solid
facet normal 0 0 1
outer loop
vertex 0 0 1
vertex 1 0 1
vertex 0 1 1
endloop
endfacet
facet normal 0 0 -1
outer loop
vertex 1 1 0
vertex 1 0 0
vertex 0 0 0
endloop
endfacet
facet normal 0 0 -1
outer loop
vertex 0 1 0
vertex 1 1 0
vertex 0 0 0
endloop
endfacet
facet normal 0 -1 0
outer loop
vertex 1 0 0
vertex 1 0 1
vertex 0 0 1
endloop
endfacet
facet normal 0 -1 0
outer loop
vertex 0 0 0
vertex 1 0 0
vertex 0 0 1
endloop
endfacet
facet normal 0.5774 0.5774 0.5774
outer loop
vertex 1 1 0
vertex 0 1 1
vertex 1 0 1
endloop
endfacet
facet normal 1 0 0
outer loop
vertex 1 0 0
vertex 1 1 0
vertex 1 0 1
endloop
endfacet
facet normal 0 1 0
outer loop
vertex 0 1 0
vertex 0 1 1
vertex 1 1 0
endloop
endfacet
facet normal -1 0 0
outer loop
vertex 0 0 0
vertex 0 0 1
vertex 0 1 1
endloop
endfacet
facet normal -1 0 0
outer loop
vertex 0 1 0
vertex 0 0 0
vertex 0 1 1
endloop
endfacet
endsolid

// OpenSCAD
color("red") polyhedron(
  points=[
    [0, 0, 0],
    [1, 0, 0],
    [0, 1, 0],
    [1, 1, 0],
    [0, 0, 1],
    [1, 0, 1],
    [0, 1, 1],
    [0.000000000001, 1, 1],
  ],
  faces=[
    [6,7,5], [6,5,4],
    [0,1,3], [0,3,2],
    [4,5,1], [4,1,0],
    [5,7,3], [5,3,1],
    [7,6,2,3],
    [6,4,0], [6,0,2],
  ]);
